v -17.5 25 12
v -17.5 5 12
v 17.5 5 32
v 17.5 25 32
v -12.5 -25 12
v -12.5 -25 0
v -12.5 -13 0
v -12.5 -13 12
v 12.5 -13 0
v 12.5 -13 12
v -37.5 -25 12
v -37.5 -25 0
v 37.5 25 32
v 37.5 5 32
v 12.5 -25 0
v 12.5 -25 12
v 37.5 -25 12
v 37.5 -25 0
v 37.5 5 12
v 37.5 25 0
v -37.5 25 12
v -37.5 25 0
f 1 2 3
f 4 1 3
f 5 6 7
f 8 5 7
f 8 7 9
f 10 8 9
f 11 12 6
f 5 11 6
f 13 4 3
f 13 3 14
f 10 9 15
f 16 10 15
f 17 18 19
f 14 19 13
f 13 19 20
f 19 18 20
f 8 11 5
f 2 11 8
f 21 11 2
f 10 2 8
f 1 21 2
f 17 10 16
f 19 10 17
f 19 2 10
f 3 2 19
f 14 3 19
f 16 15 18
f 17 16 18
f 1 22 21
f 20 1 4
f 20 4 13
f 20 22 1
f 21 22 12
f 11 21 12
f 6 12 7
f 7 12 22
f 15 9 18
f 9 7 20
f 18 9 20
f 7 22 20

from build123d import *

# Parameters (mm, degrees)
F1_DEPTH = 12
F2_W     = 55
F2_H     = 20
F3_DEPTH = 20
F5_DEPTH = 25


with BuildPart() as f1:
    # F0 (on Top) → F1 (new body)
    with BuildSketch(Plane.XY):
        Polygon((37.5, 25), (-37.5, 25), (-37.5, -25), (-12.5, -25), (-12.5, -13), (12.5, -13), (12.5, -25), (37.5, -25), align=None)
    extrude(amount=F1_DEPTH)

    # F2 (on face) → F3 (join)
    with BuildSketch(Plane.XY.offset(12)):
        with Locations((10, 15)):
            Rectangle(F2_W, F2_H)
    extrude(amount=F3_DEPTH)

    # F4 (on face) → F5 (cut)
    with BuildSketch(Plane.XZ.offset(-5)):
        Polygon((-17.5, 12), (17.5, 32), (-17.5, 32), align=None)
    extrude(amount=-F5_DEPTH, mode=Mode.SUBTRACT)


solid = f1.part
